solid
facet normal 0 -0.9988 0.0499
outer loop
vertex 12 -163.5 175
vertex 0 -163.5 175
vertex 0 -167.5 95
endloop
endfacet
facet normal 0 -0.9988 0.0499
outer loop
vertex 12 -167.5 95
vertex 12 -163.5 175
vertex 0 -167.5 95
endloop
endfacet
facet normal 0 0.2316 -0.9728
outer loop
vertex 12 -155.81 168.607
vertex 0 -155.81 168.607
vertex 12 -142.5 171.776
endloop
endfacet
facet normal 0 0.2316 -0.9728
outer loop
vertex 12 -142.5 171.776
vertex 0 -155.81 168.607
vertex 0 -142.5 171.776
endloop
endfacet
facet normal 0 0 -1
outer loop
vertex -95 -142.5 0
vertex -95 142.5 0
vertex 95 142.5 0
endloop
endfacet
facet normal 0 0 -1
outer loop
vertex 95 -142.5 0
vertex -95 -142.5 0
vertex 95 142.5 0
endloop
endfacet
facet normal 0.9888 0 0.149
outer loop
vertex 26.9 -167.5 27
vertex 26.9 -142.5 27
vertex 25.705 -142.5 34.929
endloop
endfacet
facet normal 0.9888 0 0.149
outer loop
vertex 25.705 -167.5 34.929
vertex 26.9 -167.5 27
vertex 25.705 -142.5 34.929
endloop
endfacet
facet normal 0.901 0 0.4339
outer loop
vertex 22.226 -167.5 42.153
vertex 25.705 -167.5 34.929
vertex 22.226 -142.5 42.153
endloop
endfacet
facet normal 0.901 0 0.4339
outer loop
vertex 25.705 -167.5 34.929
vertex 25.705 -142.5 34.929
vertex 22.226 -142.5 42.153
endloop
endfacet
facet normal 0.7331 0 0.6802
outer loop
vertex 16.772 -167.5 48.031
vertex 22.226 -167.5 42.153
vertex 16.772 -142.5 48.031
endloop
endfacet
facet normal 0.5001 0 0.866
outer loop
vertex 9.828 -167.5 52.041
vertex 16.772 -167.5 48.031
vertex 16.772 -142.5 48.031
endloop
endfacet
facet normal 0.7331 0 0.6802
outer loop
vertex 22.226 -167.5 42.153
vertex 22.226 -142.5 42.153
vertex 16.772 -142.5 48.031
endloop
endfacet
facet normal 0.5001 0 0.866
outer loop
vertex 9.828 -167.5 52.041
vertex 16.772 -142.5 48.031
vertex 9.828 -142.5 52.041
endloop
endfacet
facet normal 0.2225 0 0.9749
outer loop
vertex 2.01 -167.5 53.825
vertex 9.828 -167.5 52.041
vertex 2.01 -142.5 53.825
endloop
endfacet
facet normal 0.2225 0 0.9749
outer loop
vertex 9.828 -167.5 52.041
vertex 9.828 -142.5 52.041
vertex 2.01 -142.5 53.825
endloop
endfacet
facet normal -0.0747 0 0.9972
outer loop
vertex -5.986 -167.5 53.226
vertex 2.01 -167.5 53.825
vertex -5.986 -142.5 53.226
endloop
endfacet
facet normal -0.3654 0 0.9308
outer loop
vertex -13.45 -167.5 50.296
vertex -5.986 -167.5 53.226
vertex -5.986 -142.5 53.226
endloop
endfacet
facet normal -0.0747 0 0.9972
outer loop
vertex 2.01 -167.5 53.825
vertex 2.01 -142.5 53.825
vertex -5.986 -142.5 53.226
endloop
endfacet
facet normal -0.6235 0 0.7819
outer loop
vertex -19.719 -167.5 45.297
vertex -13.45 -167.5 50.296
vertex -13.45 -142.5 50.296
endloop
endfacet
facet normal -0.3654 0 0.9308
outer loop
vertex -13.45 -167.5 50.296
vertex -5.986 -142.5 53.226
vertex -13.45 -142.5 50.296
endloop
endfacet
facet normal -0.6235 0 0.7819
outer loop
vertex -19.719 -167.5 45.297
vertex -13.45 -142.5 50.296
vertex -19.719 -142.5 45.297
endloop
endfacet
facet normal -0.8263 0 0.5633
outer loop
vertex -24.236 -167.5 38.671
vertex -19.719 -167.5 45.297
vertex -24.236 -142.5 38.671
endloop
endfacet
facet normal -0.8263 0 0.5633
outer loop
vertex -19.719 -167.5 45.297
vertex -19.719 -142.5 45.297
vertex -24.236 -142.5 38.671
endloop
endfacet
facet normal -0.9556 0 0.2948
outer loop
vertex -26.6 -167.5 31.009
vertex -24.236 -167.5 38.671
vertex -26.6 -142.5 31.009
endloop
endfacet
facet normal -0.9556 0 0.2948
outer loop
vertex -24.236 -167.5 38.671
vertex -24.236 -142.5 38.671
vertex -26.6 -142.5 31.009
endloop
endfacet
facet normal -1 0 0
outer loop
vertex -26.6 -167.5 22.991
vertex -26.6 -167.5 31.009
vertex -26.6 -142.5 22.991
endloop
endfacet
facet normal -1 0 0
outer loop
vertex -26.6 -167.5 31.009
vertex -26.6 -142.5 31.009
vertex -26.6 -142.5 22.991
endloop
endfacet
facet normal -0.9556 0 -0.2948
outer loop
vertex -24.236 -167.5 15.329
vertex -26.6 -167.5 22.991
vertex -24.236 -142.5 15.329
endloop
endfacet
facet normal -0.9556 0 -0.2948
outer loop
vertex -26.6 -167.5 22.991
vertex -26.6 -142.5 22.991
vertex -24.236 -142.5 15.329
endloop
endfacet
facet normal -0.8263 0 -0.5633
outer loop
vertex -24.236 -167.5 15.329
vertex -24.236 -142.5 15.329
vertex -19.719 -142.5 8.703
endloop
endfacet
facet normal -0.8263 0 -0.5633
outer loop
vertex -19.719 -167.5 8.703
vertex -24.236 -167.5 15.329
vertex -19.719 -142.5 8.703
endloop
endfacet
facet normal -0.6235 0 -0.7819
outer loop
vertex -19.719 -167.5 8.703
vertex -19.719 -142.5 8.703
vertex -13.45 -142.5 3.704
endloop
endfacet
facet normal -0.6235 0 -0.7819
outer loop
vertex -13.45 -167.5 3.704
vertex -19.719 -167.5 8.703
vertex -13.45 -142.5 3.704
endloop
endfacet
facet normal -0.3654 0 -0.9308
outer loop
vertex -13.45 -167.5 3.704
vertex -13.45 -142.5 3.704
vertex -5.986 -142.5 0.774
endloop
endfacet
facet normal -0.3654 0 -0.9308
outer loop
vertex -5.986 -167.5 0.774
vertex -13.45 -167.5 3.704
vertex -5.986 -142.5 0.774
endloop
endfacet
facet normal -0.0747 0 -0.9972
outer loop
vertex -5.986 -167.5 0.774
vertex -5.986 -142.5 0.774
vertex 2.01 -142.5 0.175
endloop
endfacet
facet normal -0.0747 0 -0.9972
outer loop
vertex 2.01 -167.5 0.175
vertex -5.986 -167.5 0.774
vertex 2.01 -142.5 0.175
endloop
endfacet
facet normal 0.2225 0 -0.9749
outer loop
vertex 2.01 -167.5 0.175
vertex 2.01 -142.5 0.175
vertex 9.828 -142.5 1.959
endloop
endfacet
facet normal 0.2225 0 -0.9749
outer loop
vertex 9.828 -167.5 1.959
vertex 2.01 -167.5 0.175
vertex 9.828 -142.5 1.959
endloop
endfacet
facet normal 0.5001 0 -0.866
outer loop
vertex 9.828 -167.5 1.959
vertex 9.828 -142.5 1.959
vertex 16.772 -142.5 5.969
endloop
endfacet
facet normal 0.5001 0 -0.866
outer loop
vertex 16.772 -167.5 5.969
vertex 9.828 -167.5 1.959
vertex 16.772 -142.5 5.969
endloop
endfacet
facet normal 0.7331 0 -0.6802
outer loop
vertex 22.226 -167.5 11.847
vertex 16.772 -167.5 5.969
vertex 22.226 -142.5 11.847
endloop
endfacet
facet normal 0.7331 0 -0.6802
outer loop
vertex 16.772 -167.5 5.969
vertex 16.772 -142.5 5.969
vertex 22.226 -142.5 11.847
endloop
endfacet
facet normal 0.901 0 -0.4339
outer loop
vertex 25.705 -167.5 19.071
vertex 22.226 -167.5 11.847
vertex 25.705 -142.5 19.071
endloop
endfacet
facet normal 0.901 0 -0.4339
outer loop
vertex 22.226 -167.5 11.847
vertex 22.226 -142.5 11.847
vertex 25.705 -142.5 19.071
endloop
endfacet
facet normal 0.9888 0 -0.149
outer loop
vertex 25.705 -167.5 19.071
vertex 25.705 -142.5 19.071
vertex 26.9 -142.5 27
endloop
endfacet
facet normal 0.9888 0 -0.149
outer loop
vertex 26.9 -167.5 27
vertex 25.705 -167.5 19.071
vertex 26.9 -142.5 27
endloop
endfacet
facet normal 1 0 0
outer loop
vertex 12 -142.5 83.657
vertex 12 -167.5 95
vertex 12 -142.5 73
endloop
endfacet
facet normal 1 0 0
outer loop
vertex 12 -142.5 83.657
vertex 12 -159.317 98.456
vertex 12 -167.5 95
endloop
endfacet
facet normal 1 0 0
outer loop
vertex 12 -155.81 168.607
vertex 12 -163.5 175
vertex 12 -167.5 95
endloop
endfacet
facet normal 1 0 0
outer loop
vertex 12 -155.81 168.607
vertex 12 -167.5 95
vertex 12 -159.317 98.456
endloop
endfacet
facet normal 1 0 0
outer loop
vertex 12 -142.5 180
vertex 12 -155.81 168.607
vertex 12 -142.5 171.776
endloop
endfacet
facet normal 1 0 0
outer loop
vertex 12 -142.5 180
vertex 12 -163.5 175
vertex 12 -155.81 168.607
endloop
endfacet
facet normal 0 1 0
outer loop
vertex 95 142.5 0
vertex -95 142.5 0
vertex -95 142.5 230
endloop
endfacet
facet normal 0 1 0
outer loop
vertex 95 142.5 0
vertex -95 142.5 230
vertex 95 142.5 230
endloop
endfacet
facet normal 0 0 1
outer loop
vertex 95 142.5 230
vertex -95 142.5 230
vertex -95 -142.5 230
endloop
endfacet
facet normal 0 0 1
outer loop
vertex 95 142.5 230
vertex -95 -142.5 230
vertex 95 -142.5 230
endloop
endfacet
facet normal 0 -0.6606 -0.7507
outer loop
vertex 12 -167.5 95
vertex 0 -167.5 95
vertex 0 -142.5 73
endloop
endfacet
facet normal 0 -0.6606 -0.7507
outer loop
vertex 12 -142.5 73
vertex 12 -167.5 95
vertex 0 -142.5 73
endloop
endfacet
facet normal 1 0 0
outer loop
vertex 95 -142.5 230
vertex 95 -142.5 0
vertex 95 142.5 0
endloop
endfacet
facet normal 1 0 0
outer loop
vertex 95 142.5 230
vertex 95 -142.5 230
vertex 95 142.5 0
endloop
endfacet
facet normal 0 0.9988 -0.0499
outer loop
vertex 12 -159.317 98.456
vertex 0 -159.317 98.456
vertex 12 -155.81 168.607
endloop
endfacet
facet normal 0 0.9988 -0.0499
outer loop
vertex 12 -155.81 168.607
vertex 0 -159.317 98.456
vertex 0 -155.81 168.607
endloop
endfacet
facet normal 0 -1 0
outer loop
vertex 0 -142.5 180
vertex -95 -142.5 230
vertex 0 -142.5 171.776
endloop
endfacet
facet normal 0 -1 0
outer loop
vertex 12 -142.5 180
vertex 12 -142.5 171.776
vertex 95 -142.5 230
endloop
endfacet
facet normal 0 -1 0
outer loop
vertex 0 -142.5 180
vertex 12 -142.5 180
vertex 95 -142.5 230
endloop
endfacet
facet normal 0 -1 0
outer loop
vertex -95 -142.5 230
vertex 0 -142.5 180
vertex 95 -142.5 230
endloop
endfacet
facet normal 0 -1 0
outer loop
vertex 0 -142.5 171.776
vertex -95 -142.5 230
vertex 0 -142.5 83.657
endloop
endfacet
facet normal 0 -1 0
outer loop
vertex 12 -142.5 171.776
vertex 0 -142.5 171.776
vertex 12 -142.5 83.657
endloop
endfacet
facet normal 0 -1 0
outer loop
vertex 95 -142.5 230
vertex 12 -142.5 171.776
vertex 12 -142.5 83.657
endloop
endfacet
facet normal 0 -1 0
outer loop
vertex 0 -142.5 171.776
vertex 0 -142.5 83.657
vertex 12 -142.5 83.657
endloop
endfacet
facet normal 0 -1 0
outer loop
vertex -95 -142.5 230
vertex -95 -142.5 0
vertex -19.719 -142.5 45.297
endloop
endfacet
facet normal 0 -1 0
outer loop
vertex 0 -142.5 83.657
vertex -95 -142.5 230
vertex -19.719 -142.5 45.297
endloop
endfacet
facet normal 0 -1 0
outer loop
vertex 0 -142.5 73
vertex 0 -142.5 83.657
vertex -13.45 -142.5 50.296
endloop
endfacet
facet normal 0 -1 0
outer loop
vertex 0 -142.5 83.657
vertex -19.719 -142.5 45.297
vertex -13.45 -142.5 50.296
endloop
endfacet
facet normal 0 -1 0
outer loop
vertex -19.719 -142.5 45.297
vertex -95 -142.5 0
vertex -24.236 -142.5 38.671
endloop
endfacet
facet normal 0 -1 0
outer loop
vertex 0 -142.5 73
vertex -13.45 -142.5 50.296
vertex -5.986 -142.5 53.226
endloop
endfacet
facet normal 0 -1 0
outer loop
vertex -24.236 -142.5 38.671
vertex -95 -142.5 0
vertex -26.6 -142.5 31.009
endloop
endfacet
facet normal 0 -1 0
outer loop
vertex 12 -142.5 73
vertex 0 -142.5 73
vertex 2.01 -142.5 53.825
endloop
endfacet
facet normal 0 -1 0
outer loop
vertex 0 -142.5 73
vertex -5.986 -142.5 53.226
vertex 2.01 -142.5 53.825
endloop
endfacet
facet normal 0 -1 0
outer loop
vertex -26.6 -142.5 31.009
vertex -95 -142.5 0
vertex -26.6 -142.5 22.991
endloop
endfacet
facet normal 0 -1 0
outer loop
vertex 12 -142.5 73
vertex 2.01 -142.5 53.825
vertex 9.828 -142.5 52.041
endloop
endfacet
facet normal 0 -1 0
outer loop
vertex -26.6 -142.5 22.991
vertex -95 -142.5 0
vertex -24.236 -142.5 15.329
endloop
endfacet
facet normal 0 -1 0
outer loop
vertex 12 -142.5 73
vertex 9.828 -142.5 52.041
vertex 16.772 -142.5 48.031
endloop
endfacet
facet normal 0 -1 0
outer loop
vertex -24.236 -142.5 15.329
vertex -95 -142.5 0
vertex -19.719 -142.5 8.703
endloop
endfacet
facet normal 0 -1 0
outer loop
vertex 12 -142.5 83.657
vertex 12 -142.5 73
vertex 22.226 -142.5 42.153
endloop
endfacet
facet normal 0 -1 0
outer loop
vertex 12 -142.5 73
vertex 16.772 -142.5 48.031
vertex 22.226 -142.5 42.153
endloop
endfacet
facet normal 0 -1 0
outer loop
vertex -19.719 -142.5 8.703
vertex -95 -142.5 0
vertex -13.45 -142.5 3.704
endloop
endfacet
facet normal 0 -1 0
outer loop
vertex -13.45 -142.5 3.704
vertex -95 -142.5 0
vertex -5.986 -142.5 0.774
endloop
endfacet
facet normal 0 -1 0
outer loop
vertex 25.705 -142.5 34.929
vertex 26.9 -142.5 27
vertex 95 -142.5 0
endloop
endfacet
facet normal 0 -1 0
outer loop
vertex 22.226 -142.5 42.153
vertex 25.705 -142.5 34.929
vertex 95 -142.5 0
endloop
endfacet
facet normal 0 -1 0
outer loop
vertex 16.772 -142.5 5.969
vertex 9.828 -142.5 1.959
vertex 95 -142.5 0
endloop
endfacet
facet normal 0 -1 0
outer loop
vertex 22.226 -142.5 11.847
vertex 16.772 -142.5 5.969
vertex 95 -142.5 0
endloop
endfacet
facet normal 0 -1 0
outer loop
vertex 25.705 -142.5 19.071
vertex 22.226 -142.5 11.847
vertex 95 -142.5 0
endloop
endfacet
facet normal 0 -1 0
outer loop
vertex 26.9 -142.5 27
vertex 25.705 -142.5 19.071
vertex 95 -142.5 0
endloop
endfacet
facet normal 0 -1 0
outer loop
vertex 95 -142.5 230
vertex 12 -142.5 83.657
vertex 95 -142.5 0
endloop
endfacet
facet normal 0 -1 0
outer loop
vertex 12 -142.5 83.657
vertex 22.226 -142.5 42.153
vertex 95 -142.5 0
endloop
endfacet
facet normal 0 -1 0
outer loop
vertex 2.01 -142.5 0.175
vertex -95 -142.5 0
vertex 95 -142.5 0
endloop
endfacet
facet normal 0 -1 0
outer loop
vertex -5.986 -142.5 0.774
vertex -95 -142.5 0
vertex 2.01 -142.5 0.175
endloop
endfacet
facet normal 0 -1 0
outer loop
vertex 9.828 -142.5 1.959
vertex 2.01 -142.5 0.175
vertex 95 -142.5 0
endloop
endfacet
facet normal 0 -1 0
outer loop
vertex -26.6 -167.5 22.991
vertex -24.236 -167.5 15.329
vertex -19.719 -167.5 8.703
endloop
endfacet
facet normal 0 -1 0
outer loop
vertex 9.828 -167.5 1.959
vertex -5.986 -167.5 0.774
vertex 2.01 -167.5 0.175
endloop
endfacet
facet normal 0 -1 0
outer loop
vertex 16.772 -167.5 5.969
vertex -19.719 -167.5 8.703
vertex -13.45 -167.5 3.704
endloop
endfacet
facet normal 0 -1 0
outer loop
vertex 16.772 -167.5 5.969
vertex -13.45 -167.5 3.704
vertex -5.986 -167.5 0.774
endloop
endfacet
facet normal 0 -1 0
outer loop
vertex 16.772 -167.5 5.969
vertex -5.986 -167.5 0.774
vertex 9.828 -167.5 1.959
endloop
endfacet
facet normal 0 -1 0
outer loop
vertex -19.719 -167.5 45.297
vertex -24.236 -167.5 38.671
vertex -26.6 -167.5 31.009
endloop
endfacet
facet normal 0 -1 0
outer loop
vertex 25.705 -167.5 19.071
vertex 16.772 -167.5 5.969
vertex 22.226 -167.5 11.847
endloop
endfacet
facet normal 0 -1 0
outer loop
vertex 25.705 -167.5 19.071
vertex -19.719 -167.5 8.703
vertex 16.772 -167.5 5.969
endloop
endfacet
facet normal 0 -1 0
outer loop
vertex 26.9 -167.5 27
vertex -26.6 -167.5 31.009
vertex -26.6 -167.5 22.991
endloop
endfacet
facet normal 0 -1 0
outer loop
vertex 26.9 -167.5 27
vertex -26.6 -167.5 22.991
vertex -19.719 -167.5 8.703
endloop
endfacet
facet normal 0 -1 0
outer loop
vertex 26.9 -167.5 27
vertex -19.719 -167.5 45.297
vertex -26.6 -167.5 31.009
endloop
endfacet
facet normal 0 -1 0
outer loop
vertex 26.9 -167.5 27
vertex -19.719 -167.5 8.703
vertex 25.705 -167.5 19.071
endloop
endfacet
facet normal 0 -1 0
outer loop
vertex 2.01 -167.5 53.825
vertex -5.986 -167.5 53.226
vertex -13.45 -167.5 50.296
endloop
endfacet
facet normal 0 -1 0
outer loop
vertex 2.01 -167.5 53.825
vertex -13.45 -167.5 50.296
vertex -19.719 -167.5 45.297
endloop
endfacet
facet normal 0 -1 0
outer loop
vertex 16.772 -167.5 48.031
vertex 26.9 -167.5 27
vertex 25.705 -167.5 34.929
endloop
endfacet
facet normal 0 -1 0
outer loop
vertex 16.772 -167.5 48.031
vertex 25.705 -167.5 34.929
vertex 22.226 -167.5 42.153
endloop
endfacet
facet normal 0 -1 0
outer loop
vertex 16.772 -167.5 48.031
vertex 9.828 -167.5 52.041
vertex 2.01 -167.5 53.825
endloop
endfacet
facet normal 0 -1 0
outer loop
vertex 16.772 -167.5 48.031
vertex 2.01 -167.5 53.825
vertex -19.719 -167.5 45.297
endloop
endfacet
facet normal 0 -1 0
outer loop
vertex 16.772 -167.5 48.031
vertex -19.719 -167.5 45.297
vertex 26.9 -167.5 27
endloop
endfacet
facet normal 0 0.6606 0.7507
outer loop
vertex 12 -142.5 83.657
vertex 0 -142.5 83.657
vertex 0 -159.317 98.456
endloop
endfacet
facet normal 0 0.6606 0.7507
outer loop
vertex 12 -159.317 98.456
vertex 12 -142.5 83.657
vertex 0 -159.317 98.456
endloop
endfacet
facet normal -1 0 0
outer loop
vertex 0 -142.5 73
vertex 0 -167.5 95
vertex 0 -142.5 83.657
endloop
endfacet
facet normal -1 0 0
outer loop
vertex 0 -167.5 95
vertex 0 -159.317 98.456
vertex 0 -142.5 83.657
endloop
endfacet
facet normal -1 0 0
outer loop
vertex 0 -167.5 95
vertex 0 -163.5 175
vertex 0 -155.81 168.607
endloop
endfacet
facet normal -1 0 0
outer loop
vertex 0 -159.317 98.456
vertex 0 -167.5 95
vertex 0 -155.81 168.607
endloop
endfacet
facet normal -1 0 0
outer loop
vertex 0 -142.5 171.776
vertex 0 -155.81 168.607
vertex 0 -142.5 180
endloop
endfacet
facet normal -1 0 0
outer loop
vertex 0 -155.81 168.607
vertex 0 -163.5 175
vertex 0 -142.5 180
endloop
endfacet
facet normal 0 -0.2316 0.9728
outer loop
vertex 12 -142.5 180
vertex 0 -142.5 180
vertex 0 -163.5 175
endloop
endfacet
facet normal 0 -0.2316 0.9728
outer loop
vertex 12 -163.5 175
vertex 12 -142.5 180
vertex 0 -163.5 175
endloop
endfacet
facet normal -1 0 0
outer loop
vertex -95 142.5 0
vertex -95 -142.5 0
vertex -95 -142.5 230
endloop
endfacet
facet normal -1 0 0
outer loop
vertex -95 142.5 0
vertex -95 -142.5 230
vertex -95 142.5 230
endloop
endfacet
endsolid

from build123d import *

# Parameters (mm, degrees)
F0_W     = 190
F0_H     = 285
F1_DEPTH = 230
F2_R     = 26.9
F3_DEPTH = 25
F5_DEPTH = 12


with BuildPart() as f1:
    # F0 (on Top) → F1 (new body)
    with BuildSketch(Plane.XY):
        Rectangle(F0_W, F0_H)
    extrude(amount=F1_DEPTH)

    # F2 (on face) → F3 (join)
    with BuildSketch(Plane.XZ.offset(142.5)):
        with Locations((0, 27)):
            Circle(F2_R)
    extrude(amount=F3_DEPTH)

    # F4 (on Right) → F5 (join)
    with BuildSketch(Plane.YZ):
        Polygon((-142.5, 171.776368), (-142.5, 180), (-163.5, 175), (-167.5, 95), (-142.5, 73), (-142.5, 83.656529), (-159.317222, 98.455684), (-155.809636, 168.607407), align=None)
    extrude(amount=F5_DEPTH)


solid = f1.part
